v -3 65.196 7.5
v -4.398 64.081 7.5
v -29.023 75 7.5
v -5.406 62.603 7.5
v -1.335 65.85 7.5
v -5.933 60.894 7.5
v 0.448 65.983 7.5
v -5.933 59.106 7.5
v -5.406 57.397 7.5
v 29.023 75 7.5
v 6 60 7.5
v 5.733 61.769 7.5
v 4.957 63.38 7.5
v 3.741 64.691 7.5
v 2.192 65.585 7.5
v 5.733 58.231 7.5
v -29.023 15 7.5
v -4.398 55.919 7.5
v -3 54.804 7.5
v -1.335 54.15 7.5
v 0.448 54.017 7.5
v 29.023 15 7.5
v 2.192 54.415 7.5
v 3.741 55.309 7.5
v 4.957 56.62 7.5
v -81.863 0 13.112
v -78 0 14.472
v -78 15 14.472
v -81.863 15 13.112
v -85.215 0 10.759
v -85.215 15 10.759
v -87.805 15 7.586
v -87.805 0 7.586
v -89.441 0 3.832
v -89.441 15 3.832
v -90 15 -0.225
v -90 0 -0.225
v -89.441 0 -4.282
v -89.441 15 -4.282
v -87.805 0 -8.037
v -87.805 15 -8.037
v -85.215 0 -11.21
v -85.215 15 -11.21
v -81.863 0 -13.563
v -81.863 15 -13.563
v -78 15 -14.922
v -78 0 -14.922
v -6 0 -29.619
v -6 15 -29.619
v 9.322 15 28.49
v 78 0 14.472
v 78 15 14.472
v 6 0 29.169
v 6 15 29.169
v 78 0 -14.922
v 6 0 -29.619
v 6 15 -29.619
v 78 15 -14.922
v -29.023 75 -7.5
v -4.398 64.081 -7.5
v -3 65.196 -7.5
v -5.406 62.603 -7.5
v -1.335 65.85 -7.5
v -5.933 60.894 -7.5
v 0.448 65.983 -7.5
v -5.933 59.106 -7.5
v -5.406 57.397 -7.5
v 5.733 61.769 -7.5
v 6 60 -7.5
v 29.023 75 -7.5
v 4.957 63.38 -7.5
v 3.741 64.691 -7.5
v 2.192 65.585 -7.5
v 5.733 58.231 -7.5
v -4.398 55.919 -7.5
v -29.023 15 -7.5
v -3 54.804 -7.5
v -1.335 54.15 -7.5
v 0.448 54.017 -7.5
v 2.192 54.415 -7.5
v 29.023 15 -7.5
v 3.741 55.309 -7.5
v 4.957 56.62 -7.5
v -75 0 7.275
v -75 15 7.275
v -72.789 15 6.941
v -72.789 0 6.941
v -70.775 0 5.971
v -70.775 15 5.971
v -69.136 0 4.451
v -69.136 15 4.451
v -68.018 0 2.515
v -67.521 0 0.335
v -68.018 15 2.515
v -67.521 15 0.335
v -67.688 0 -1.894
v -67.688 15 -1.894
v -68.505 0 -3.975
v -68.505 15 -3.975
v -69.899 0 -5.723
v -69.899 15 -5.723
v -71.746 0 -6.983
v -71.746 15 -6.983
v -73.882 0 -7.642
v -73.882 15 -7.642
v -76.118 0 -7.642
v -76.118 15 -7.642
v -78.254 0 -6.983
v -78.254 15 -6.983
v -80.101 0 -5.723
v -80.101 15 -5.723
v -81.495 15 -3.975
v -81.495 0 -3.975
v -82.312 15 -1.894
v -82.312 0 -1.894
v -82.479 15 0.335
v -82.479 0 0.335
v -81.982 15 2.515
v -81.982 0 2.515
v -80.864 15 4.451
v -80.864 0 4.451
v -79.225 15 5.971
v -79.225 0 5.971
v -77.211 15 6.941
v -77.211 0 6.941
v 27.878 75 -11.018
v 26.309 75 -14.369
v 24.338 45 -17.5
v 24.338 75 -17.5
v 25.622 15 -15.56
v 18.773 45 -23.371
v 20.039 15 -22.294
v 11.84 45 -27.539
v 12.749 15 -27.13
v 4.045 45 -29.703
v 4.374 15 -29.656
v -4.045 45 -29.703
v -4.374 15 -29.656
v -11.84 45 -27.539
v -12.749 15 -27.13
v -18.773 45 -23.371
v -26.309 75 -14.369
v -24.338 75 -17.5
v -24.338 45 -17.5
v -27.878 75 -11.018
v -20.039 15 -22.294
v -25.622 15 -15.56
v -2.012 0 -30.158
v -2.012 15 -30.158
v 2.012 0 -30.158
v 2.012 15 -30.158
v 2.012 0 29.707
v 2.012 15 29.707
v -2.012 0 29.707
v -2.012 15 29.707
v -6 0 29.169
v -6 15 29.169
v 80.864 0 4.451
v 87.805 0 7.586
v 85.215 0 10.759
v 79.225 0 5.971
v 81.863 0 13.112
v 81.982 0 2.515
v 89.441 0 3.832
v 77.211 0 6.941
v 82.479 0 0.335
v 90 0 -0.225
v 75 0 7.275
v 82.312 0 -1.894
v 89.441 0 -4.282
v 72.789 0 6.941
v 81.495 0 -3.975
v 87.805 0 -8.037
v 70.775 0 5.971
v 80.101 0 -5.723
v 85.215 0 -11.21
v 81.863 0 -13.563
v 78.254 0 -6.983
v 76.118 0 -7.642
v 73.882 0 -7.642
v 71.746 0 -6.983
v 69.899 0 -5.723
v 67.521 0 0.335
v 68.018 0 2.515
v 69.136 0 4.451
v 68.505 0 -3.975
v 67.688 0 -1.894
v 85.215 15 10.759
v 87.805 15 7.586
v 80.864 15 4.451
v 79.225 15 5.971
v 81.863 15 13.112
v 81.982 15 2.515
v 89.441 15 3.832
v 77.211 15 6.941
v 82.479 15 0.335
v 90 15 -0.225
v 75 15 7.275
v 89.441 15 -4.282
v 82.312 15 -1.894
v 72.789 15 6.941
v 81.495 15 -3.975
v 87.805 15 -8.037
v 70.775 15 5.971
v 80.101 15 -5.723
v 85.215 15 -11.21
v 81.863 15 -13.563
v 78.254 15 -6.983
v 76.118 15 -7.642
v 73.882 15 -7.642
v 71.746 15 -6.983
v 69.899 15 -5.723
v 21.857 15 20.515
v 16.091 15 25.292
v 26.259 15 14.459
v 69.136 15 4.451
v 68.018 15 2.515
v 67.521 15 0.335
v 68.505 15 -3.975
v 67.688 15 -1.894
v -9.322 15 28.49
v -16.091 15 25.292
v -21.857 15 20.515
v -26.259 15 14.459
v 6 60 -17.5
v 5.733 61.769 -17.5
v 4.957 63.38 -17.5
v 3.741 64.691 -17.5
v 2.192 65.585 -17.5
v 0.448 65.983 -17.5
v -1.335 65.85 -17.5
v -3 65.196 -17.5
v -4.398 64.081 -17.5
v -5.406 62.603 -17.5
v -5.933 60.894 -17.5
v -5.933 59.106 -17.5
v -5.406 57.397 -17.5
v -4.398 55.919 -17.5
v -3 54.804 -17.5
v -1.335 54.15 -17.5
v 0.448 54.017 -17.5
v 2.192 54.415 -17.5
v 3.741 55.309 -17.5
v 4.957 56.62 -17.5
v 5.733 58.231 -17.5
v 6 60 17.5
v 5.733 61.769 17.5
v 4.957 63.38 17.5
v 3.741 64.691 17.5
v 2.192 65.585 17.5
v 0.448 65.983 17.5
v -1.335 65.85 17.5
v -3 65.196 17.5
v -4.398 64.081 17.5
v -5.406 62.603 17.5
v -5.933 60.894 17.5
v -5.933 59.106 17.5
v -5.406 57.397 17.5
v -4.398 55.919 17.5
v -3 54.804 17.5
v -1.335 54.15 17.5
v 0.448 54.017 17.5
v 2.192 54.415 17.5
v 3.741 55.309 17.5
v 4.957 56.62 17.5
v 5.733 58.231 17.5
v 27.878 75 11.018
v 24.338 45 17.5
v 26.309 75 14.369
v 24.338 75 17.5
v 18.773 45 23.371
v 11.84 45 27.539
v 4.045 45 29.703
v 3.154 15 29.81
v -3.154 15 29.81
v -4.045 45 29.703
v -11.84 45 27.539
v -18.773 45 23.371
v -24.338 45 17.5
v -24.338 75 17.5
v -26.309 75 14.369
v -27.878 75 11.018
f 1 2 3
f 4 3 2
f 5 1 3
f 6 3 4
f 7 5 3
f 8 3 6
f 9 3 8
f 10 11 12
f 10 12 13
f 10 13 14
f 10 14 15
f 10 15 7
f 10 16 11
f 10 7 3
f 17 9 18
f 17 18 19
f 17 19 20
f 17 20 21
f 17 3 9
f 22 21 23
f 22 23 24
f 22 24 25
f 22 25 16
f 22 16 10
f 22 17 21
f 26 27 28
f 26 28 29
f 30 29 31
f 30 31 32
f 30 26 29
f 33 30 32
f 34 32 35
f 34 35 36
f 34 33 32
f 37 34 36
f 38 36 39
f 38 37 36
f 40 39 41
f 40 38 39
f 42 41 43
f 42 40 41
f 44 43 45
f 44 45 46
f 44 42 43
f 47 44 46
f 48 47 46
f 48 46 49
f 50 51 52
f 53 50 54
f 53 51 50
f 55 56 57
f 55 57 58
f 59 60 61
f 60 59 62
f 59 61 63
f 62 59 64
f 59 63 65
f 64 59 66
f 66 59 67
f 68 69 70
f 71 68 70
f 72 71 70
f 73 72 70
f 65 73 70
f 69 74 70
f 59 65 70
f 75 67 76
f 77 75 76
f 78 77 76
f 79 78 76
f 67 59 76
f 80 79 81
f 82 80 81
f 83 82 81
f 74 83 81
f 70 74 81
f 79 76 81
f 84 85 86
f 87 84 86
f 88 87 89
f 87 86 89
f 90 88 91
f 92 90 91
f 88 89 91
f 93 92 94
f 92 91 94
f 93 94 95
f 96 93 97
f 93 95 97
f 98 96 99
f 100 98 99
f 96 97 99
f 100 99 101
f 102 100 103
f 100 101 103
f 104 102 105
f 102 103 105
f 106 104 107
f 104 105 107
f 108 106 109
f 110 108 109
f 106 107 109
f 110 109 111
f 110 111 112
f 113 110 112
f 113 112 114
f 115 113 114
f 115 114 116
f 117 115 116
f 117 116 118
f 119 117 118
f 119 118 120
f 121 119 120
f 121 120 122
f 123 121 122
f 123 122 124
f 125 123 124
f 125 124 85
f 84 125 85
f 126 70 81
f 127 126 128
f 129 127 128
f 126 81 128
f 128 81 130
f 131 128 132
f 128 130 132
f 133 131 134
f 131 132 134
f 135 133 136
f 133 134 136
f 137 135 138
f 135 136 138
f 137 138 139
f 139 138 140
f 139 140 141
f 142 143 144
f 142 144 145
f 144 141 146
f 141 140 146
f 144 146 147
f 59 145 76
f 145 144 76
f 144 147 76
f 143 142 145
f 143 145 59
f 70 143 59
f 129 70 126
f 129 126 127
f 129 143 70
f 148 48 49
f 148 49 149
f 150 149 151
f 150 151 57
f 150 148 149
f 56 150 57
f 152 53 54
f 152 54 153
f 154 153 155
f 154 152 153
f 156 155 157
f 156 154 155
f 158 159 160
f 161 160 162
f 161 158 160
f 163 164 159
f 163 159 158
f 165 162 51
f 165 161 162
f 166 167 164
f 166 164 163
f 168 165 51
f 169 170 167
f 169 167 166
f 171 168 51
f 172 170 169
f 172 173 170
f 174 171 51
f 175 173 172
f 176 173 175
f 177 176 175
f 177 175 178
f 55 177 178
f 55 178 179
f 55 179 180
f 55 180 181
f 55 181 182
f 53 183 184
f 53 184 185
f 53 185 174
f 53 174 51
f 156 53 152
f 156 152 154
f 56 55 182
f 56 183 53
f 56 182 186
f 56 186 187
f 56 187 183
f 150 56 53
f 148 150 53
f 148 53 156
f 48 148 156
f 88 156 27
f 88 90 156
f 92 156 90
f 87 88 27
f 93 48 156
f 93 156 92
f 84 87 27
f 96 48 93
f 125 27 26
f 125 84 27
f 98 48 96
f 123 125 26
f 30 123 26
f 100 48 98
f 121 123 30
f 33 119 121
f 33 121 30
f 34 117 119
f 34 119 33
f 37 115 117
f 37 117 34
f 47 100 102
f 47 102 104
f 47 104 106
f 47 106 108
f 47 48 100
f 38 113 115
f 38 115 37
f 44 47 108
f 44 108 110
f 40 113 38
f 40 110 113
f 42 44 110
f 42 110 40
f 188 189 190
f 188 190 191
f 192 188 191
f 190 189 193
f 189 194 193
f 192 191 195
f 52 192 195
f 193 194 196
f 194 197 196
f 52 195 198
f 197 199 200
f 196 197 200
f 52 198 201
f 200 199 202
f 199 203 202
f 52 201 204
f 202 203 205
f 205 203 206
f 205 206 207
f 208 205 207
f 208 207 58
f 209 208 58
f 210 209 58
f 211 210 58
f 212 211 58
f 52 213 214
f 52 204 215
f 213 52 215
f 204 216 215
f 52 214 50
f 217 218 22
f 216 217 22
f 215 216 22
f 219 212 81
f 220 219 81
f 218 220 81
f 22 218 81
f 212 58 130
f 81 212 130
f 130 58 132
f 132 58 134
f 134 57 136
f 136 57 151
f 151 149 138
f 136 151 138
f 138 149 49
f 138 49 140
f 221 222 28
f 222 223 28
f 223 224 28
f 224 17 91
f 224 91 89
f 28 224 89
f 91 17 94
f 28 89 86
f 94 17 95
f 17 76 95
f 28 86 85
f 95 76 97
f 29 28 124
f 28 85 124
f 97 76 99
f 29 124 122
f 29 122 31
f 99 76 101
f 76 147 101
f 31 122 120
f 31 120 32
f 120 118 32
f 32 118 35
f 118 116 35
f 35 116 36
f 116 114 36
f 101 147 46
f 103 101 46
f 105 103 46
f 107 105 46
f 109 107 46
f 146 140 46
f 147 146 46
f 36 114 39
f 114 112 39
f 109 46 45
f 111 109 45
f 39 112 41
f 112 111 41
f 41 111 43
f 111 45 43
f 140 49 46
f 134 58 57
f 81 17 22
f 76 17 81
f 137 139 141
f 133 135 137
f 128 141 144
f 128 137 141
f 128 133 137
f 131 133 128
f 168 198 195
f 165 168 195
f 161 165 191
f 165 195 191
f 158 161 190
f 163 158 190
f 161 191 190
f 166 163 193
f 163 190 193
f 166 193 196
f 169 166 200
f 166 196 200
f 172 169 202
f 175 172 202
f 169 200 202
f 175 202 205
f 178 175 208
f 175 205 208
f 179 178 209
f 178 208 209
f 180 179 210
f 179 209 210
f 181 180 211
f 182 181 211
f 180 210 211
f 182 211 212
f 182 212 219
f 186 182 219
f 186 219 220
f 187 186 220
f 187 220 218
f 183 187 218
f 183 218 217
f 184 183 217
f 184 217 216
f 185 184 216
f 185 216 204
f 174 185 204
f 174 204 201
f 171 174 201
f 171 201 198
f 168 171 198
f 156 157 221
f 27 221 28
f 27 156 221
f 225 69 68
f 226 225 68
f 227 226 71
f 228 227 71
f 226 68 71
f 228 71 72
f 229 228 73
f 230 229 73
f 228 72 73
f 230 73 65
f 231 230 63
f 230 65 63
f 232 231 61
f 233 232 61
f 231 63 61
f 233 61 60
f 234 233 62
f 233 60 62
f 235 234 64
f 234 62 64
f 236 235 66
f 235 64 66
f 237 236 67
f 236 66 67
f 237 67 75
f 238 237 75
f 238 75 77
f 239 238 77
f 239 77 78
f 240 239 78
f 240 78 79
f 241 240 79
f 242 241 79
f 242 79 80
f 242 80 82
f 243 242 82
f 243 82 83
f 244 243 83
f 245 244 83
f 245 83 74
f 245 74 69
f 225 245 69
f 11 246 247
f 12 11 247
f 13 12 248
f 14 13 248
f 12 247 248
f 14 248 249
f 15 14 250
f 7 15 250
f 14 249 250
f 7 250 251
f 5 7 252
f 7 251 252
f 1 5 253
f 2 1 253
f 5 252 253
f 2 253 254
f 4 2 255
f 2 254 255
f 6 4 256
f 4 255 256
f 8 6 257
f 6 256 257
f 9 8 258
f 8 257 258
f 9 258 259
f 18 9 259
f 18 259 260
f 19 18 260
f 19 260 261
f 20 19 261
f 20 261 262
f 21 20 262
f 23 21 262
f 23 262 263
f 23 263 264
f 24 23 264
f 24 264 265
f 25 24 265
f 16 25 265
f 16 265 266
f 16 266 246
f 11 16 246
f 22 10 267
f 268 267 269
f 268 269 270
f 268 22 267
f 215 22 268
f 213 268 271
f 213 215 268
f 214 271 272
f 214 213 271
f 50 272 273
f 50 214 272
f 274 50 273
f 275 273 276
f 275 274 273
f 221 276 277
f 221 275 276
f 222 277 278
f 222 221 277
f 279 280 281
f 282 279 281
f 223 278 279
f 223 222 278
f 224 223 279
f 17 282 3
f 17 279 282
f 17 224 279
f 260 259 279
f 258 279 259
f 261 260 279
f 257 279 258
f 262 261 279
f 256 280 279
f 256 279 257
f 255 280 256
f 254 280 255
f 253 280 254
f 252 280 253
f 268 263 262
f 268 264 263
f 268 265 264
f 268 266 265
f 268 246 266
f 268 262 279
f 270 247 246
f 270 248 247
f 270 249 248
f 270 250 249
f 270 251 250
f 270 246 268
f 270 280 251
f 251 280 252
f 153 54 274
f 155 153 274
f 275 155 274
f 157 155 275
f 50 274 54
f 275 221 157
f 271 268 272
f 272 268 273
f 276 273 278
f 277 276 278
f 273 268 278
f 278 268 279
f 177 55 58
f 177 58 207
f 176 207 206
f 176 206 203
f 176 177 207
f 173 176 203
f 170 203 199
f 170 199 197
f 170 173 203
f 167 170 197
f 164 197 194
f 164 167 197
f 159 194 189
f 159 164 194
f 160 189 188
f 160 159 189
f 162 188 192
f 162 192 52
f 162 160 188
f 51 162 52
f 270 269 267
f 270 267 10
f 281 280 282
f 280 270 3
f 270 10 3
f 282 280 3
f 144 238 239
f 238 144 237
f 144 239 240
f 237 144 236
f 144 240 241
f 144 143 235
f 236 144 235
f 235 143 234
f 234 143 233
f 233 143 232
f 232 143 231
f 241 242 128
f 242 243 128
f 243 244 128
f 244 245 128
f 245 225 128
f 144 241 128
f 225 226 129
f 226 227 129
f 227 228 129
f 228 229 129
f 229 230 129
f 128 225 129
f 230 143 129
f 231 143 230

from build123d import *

# Parameters (mm, degrees)
BOSS_EXTRUDE1_DEPTH = 15
BOSS_EXTRUDE2_DEPTH = 60
CUT_EXTRUDE1_DEPTH  = 30
SKETCH4_R           = 6
CUT_EXTRUDE2_DEPTH  = 64
SKETCH5_R           = 7.5
CUT_EXTRUDE3_DEPTH  = 64


with BuildPart() as part:
    # Sketch1 → Boss-Extrude1 (new body)
    with BuildSketch(Plane(origin=(0, 0, 0), x_dir=(1, 0, 0), z_dir=(0, 1, 0))):
        with BuildLine():
            Line((-78, 14.922292207), (-6, 29.619230664))
            ThreePointArc((-6, 29.619230664), (0, 30.22535375), (6, 29.619230664))
            Line((6, 29.619230664), (78, 14.922292207))
            ThreePointArc((78, 14.922292207), (90, 0.22535375), (78, -14.471584706))
            Line((78, -14.471584706), (6, -29.168523163))
            ThreePointArc((6, -29.168523163), (0, -29.77464625), (-6, -29.168523163))
            Line((-6, -29.168523163), (-78, -14.471584706))
            ThreePointArc((-78, -14.471584706), (-90, 0.22535375), (-78, 14.922292207))
        make_face()
    extrude(amount=BOSS_EXTRUDE1_DEPTH)

    # Sketch2 → Boss-Extrude2 (add)
    with BuildSketch(Plane(origin=(0, 15, 0), x_dir=(1, 0, 0), z_dir=(0, 1, 0))):
        with BuildLine():
            Line((-29.023299464, 7.5), (29.023299464, 7.5))
            ThreePointArc((29.023299464, 7.5), (0, 29.976689473), (-29.023299464, 7.5))
        make_face()
        with BuildLine():
            Line((-29.023299464, -7.5), (29.023299464, -7.5))
            ThreePointArc((29.023299464, -7.5), (0, -29.976689473), (-29.023299464, -7.5))
        make_face()
    extrude(amount=BOSS_EXTRUDE2_DEPTH)

    # Sketch3 → Cut-Extrude1 (cut)
    with BuildSketch(Plane(origin=(0, 75, 0), x_dir=(1, 0, 0), z_dir=(0, 1, 0))):
        with BuildLine():
            Line((-24.366985862, 17.5), (24.366985862, 17.5))
            ThreePointArc((24.366985862, 17.5), (0, 30), (-24.366985862, 17.5))
        make_face()
        with BuildLine():
            Line((-24.366985862, -17.5), (24.366985862, -17.5))
            ThreePointArc((24.366985862, -17.5), (0, -30), (-24.366985862, -17.5))
        make_face()
    extrude(amount=-CUT_EXTRUDE1_DEPTH, mode=Mode.SUBTRACT)

    # Sketch4 → Cut-Extrude2 (cut)
    with BuildSketch(Plane.XY.offset(17.5)):
        with Locations((0, 60)):
            Circle(SKETCH4_R)
    extrude(amount=-CUT_EXTRUDE2_DEPTH, mode=Mode.SUBTRACT)

    # Sketch5 → Cut-Extrude3 (cut)
    with BuildSketch(Plane(origin=(0, 15, 0), x_dir=(1, 0, 0), z_dir=(0, 1, 0))):
        with Locations(Location((-75, 0.22535375, 0), (0, 0, 270))):
            Circle(SKETCH5_R)
        with Locations(Location((75, 0.22535375, 0), (0, 0, 270))):
            Circle(SKETCH5_R)
    extrude(amount=-CUT_EXTRUDE3_DEPTH, mode=Mode.SUBTRACT)


solid = part.part
